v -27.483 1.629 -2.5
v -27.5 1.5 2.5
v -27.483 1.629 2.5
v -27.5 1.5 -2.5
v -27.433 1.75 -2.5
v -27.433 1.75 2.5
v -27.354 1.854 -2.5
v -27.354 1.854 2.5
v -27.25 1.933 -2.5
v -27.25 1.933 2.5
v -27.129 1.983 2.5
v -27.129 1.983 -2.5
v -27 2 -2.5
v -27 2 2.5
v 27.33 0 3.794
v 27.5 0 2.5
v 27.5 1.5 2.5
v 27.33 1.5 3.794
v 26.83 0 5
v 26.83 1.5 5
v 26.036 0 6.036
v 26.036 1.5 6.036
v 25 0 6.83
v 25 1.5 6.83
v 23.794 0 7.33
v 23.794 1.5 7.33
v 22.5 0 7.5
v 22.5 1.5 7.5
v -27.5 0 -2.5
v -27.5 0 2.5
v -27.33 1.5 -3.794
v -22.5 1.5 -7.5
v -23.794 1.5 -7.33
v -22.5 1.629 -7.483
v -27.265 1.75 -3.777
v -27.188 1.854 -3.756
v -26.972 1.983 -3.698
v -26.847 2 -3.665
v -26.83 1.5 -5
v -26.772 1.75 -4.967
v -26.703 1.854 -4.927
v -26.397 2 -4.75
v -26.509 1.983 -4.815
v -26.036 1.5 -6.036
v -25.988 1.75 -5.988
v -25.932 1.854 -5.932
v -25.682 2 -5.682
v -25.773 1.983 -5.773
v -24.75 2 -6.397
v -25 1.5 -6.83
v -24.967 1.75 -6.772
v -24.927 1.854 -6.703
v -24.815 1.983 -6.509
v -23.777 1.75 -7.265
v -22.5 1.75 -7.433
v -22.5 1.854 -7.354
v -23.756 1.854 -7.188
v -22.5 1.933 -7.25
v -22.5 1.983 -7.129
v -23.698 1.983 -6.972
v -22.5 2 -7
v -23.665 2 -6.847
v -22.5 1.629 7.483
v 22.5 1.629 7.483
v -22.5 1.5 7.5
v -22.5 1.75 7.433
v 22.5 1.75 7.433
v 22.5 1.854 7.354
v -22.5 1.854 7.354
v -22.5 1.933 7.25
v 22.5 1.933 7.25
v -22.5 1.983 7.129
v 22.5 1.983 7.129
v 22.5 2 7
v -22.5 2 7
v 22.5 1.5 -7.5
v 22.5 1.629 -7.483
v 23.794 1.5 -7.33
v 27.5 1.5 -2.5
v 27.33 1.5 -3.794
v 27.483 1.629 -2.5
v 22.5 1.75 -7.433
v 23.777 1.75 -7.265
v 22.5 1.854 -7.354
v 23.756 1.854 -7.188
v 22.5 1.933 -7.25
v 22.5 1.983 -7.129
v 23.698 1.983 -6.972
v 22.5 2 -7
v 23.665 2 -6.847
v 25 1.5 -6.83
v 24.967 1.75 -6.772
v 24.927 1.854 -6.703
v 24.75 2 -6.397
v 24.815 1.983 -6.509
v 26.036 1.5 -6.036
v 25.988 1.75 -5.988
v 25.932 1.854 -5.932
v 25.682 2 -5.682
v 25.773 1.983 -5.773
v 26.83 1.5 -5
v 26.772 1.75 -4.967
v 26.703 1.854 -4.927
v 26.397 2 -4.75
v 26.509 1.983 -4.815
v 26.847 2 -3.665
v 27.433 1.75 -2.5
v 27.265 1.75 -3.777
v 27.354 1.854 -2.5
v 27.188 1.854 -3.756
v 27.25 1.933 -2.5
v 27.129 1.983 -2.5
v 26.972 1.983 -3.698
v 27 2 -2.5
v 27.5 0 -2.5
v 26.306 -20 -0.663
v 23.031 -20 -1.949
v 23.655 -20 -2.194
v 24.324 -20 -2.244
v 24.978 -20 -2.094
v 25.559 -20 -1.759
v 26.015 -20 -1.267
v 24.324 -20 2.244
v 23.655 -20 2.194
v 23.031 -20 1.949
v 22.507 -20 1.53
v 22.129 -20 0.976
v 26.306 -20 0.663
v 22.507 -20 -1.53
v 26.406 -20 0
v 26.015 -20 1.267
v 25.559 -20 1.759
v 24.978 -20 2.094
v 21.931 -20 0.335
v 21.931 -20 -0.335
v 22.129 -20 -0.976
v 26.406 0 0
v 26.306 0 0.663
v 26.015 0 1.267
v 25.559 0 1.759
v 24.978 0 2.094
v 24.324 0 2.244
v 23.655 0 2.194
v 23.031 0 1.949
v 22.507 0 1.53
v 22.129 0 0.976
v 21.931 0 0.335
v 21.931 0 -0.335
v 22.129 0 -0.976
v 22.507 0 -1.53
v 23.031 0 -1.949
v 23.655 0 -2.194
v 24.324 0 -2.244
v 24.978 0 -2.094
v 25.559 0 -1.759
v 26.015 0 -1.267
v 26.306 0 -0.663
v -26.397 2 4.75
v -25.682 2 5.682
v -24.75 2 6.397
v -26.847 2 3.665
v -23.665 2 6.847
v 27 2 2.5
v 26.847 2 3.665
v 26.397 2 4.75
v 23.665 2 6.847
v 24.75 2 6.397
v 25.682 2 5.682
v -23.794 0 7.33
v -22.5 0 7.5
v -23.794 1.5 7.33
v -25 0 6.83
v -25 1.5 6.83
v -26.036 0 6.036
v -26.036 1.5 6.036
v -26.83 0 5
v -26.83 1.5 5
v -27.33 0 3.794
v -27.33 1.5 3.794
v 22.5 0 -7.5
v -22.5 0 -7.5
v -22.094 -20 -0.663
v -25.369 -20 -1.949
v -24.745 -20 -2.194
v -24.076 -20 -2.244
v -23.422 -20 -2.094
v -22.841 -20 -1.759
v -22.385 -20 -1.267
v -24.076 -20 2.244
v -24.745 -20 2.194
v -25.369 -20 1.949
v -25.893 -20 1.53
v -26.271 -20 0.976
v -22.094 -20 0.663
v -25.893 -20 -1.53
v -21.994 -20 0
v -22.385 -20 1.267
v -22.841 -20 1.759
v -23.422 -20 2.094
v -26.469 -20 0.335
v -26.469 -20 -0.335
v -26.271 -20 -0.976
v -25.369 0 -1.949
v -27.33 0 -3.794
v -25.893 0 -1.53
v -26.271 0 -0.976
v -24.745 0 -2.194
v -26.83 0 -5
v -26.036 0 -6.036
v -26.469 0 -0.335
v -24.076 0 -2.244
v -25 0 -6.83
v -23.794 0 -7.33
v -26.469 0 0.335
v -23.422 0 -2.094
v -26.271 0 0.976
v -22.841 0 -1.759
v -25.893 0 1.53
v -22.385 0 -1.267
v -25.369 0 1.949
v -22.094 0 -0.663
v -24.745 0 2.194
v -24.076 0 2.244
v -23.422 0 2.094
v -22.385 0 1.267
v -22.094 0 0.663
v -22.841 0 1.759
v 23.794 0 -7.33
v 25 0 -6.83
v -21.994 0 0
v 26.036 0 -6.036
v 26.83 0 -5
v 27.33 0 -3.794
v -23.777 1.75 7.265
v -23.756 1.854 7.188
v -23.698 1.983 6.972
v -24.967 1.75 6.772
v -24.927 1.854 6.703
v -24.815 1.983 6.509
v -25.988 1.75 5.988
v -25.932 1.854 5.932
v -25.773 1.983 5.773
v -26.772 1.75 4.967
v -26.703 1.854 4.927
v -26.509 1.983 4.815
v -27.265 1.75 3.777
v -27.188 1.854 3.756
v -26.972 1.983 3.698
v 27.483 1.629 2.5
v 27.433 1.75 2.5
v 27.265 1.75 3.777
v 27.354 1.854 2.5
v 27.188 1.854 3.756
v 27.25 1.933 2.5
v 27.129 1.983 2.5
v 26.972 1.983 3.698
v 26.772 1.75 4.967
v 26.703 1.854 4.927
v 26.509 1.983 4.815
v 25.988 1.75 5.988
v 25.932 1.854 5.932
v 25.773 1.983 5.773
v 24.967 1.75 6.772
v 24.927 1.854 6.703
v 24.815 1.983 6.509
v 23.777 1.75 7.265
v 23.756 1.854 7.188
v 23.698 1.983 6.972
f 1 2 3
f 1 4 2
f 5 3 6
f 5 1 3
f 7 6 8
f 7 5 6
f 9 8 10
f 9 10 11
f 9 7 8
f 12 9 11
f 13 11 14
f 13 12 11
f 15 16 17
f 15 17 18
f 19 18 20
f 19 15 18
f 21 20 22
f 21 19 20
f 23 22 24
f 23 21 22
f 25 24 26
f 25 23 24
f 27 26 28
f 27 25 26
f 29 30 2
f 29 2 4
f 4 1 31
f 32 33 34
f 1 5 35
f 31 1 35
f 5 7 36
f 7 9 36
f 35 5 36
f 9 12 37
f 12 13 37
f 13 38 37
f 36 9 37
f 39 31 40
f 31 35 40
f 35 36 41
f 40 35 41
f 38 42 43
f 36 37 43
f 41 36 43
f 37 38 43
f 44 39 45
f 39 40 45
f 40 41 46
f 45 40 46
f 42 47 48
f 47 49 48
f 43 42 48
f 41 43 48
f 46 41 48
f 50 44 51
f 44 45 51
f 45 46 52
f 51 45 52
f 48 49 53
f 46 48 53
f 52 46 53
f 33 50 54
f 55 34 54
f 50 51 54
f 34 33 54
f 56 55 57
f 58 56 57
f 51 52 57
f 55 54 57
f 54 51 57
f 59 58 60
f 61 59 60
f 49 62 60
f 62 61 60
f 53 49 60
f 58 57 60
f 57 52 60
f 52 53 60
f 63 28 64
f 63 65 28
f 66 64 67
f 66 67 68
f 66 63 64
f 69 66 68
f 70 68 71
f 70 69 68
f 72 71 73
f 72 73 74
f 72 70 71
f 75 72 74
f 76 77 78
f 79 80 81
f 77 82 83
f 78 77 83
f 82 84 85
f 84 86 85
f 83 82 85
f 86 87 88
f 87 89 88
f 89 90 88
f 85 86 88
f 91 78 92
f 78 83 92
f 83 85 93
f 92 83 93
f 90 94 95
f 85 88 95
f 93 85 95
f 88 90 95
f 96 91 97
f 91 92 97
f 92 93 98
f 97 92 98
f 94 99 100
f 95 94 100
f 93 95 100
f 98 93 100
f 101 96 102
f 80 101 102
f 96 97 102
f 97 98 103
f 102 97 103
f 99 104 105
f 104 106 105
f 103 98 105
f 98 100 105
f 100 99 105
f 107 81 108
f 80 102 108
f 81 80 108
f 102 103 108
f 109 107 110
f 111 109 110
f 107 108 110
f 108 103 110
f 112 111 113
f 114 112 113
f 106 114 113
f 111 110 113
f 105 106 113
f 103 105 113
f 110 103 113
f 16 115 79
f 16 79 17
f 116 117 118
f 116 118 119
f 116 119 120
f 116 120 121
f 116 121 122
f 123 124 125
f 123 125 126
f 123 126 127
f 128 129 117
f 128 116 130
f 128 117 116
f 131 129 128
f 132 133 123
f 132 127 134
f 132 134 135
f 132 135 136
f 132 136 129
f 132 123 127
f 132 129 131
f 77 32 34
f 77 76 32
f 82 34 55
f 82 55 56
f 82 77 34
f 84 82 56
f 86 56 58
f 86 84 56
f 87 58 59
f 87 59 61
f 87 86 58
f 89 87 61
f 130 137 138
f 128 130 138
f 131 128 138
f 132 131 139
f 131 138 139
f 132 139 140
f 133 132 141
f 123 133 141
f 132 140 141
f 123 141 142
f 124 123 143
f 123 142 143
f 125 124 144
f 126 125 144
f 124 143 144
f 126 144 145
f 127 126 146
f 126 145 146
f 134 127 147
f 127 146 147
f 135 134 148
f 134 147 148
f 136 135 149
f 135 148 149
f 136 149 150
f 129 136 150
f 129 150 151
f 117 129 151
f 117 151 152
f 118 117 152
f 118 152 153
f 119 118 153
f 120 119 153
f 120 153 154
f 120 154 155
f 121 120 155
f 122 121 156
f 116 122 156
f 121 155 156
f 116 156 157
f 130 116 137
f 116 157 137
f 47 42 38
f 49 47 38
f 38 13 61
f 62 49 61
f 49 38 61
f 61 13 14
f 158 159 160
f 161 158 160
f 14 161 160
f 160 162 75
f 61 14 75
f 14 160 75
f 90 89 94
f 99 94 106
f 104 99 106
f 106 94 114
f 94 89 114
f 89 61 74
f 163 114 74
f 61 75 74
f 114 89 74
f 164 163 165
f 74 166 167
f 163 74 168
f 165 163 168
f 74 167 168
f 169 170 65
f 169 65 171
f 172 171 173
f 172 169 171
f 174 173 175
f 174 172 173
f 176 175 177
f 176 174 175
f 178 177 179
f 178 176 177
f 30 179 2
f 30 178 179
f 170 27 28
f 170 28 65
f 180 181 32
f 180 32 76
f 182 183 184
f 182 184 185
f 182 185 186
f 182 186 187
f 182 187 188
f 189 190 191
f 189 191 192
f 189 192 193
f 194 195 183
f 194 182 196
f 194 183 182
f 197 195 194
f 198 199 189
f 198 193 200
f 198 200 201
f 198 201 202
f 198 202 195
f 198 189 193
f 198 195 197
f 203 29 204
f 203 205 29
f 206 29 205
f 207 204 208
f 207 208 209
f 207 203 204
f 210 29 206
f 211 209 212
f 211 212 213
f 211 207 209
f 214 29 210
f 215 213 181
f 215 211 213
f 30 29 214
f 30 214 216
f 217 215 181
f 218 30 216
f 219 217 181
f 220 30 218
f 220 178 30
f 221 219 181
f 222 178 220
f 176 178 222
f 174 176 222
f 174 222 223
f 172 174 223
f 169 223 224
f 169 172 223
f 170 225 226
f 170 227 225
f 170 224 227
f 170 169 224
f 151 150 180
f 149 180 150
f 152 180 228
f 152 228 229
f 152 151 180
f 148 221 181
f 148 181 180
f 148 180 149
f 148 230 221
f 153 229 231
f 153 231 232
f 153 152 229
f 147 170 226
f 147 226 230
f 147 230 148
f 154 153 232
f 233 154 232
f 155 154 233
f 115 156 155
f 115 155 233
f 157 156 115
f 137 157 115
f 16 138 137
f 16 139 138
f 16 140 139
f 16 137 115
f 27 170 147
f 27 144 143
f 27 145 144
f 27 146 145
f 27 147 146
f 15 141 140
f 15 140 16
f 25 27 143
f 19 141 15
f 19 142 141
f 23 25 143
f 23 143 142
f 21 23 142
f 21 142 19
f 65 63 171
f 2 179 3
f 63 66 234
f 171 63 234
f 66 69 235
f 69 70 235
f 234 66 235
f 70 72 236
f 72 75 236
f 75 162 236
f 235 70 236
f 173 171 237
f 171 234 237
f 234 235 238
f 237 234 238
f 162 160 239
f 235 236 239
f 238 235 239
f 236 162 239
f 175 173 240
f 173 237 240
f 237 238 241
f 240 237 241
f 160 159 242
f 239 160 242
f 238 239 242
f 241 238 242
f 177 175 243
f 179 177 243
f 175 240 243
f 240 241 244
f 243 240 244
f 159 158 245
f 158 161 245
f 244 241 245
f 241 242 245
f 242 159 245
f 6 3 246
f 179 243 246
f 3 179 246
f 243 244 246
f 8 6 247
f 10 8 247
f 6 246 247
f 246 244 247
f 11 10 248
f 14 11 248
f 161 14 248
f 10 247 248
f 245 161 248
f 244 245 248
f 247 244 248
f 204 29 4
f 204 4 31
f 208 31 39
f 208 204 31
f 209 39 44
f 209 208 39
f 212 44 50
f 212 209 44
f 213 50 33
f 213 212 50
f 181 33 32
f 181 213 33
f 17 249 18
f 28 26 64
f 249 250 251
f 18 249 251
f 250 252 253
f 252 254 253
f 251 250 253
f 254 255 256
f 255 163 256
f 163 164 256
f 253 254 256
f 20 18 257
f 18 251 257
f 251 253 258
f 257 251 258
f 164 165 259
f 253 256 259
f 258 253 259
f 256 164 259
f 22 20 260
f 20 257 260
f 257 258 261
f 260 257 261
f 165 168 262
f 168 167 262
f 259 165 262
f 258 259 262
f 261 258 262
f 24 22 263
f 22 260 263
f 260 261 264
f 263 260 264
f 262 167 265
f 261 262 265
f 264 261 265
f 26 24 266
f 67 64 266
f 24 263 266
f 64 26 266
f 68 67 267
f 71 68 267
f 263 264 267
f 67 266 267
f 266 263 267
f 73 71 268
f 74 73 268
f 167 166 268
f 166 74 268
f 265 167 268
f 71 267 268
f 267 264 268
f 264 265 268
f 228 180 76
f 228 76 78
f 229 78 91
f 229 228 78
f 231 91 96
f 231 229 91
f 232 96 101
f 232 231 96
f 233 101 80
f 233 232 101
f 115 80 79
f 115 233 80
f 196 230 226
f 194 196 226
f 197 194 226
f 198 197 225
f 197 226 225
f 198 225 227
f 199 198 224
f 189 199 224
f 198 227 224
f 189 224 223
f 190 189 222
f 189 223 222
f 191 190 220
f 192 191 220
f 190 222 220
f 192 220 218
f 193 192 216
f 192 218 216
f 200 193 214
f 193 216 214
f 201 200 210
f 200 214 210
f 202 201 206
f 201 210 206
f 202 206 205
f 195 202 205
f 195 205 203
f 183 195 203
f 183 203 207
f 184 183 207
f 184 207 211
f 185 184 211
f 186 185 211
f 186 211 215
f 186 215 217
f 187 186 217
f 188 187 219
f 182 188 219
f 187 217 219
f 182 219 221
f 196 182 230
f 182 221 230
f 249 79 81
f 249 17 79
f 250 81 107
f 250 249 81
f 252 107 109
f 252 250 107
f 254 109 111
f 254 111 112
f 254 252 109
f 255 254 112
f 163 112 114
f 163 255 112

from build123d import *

# Parameters (mm, degrees)
F1_DEPTH = 2
F2_R     = 0.5
F3_R     = 2.25
F4_DEPTH = 20


with BuildPart() as f1:
    # F0 (on Front) → F1 (new body)
    with BuildSketch(Plane.XZ):
        with BuildLine():
            Line((22.5, 7.5), (-22.5, 7.5))
            ThreePointArc((-22.5, 7.5), (-26.035534, 6.035534), (-27.5, 2.5))
            Line((-27.5, 2.5), (-27.5, -2.5))
            ThreePointArc((-27.5, -2.5), (-26.035534, -6.035534), (-22.5, -7.5))
            Line((-22.5, -7.5), (22.5, -7.5))
            ThreePointArc((22.5, -7.5), (26.035534, -6.035534), (27.5, -2.5))
            Line((27.5, -2.5), (27.5, 2.5))
            ThreePointArc((27.5, 2.5), (26.035534, 6.035534), (22.5, 7.5))
        make_face()
    extrude(amount=-F1_DEPTH)

    # F2
    f2_edges = [f1.edges().sort_by_distance(p)[0] for p in [
        (0, 2, 7.5),
        (-26.035534, 2, 6.035534),
        (-27.5, 2, 0),
        (-26.035534, 2, -6.035534),
        (0, 2, -7.5),
        (26.035534, 2, -6.035534),
        (27.5, 2, 0),
        (26.035534, 2, 6.035534),
    ]]
    fillet(f2_edges, radius=F2_R)

    # F3 (on face) → F4 (join)
    with BuildSketch(Plane.XZ):
        with Locations((24.155941, 0)):
            Circle(F3_R)
        with Locations((-24.244059, 0)):
            Circle(F3_R)
    extrude(amount=F4_DEPTH)


solid = f1.part
